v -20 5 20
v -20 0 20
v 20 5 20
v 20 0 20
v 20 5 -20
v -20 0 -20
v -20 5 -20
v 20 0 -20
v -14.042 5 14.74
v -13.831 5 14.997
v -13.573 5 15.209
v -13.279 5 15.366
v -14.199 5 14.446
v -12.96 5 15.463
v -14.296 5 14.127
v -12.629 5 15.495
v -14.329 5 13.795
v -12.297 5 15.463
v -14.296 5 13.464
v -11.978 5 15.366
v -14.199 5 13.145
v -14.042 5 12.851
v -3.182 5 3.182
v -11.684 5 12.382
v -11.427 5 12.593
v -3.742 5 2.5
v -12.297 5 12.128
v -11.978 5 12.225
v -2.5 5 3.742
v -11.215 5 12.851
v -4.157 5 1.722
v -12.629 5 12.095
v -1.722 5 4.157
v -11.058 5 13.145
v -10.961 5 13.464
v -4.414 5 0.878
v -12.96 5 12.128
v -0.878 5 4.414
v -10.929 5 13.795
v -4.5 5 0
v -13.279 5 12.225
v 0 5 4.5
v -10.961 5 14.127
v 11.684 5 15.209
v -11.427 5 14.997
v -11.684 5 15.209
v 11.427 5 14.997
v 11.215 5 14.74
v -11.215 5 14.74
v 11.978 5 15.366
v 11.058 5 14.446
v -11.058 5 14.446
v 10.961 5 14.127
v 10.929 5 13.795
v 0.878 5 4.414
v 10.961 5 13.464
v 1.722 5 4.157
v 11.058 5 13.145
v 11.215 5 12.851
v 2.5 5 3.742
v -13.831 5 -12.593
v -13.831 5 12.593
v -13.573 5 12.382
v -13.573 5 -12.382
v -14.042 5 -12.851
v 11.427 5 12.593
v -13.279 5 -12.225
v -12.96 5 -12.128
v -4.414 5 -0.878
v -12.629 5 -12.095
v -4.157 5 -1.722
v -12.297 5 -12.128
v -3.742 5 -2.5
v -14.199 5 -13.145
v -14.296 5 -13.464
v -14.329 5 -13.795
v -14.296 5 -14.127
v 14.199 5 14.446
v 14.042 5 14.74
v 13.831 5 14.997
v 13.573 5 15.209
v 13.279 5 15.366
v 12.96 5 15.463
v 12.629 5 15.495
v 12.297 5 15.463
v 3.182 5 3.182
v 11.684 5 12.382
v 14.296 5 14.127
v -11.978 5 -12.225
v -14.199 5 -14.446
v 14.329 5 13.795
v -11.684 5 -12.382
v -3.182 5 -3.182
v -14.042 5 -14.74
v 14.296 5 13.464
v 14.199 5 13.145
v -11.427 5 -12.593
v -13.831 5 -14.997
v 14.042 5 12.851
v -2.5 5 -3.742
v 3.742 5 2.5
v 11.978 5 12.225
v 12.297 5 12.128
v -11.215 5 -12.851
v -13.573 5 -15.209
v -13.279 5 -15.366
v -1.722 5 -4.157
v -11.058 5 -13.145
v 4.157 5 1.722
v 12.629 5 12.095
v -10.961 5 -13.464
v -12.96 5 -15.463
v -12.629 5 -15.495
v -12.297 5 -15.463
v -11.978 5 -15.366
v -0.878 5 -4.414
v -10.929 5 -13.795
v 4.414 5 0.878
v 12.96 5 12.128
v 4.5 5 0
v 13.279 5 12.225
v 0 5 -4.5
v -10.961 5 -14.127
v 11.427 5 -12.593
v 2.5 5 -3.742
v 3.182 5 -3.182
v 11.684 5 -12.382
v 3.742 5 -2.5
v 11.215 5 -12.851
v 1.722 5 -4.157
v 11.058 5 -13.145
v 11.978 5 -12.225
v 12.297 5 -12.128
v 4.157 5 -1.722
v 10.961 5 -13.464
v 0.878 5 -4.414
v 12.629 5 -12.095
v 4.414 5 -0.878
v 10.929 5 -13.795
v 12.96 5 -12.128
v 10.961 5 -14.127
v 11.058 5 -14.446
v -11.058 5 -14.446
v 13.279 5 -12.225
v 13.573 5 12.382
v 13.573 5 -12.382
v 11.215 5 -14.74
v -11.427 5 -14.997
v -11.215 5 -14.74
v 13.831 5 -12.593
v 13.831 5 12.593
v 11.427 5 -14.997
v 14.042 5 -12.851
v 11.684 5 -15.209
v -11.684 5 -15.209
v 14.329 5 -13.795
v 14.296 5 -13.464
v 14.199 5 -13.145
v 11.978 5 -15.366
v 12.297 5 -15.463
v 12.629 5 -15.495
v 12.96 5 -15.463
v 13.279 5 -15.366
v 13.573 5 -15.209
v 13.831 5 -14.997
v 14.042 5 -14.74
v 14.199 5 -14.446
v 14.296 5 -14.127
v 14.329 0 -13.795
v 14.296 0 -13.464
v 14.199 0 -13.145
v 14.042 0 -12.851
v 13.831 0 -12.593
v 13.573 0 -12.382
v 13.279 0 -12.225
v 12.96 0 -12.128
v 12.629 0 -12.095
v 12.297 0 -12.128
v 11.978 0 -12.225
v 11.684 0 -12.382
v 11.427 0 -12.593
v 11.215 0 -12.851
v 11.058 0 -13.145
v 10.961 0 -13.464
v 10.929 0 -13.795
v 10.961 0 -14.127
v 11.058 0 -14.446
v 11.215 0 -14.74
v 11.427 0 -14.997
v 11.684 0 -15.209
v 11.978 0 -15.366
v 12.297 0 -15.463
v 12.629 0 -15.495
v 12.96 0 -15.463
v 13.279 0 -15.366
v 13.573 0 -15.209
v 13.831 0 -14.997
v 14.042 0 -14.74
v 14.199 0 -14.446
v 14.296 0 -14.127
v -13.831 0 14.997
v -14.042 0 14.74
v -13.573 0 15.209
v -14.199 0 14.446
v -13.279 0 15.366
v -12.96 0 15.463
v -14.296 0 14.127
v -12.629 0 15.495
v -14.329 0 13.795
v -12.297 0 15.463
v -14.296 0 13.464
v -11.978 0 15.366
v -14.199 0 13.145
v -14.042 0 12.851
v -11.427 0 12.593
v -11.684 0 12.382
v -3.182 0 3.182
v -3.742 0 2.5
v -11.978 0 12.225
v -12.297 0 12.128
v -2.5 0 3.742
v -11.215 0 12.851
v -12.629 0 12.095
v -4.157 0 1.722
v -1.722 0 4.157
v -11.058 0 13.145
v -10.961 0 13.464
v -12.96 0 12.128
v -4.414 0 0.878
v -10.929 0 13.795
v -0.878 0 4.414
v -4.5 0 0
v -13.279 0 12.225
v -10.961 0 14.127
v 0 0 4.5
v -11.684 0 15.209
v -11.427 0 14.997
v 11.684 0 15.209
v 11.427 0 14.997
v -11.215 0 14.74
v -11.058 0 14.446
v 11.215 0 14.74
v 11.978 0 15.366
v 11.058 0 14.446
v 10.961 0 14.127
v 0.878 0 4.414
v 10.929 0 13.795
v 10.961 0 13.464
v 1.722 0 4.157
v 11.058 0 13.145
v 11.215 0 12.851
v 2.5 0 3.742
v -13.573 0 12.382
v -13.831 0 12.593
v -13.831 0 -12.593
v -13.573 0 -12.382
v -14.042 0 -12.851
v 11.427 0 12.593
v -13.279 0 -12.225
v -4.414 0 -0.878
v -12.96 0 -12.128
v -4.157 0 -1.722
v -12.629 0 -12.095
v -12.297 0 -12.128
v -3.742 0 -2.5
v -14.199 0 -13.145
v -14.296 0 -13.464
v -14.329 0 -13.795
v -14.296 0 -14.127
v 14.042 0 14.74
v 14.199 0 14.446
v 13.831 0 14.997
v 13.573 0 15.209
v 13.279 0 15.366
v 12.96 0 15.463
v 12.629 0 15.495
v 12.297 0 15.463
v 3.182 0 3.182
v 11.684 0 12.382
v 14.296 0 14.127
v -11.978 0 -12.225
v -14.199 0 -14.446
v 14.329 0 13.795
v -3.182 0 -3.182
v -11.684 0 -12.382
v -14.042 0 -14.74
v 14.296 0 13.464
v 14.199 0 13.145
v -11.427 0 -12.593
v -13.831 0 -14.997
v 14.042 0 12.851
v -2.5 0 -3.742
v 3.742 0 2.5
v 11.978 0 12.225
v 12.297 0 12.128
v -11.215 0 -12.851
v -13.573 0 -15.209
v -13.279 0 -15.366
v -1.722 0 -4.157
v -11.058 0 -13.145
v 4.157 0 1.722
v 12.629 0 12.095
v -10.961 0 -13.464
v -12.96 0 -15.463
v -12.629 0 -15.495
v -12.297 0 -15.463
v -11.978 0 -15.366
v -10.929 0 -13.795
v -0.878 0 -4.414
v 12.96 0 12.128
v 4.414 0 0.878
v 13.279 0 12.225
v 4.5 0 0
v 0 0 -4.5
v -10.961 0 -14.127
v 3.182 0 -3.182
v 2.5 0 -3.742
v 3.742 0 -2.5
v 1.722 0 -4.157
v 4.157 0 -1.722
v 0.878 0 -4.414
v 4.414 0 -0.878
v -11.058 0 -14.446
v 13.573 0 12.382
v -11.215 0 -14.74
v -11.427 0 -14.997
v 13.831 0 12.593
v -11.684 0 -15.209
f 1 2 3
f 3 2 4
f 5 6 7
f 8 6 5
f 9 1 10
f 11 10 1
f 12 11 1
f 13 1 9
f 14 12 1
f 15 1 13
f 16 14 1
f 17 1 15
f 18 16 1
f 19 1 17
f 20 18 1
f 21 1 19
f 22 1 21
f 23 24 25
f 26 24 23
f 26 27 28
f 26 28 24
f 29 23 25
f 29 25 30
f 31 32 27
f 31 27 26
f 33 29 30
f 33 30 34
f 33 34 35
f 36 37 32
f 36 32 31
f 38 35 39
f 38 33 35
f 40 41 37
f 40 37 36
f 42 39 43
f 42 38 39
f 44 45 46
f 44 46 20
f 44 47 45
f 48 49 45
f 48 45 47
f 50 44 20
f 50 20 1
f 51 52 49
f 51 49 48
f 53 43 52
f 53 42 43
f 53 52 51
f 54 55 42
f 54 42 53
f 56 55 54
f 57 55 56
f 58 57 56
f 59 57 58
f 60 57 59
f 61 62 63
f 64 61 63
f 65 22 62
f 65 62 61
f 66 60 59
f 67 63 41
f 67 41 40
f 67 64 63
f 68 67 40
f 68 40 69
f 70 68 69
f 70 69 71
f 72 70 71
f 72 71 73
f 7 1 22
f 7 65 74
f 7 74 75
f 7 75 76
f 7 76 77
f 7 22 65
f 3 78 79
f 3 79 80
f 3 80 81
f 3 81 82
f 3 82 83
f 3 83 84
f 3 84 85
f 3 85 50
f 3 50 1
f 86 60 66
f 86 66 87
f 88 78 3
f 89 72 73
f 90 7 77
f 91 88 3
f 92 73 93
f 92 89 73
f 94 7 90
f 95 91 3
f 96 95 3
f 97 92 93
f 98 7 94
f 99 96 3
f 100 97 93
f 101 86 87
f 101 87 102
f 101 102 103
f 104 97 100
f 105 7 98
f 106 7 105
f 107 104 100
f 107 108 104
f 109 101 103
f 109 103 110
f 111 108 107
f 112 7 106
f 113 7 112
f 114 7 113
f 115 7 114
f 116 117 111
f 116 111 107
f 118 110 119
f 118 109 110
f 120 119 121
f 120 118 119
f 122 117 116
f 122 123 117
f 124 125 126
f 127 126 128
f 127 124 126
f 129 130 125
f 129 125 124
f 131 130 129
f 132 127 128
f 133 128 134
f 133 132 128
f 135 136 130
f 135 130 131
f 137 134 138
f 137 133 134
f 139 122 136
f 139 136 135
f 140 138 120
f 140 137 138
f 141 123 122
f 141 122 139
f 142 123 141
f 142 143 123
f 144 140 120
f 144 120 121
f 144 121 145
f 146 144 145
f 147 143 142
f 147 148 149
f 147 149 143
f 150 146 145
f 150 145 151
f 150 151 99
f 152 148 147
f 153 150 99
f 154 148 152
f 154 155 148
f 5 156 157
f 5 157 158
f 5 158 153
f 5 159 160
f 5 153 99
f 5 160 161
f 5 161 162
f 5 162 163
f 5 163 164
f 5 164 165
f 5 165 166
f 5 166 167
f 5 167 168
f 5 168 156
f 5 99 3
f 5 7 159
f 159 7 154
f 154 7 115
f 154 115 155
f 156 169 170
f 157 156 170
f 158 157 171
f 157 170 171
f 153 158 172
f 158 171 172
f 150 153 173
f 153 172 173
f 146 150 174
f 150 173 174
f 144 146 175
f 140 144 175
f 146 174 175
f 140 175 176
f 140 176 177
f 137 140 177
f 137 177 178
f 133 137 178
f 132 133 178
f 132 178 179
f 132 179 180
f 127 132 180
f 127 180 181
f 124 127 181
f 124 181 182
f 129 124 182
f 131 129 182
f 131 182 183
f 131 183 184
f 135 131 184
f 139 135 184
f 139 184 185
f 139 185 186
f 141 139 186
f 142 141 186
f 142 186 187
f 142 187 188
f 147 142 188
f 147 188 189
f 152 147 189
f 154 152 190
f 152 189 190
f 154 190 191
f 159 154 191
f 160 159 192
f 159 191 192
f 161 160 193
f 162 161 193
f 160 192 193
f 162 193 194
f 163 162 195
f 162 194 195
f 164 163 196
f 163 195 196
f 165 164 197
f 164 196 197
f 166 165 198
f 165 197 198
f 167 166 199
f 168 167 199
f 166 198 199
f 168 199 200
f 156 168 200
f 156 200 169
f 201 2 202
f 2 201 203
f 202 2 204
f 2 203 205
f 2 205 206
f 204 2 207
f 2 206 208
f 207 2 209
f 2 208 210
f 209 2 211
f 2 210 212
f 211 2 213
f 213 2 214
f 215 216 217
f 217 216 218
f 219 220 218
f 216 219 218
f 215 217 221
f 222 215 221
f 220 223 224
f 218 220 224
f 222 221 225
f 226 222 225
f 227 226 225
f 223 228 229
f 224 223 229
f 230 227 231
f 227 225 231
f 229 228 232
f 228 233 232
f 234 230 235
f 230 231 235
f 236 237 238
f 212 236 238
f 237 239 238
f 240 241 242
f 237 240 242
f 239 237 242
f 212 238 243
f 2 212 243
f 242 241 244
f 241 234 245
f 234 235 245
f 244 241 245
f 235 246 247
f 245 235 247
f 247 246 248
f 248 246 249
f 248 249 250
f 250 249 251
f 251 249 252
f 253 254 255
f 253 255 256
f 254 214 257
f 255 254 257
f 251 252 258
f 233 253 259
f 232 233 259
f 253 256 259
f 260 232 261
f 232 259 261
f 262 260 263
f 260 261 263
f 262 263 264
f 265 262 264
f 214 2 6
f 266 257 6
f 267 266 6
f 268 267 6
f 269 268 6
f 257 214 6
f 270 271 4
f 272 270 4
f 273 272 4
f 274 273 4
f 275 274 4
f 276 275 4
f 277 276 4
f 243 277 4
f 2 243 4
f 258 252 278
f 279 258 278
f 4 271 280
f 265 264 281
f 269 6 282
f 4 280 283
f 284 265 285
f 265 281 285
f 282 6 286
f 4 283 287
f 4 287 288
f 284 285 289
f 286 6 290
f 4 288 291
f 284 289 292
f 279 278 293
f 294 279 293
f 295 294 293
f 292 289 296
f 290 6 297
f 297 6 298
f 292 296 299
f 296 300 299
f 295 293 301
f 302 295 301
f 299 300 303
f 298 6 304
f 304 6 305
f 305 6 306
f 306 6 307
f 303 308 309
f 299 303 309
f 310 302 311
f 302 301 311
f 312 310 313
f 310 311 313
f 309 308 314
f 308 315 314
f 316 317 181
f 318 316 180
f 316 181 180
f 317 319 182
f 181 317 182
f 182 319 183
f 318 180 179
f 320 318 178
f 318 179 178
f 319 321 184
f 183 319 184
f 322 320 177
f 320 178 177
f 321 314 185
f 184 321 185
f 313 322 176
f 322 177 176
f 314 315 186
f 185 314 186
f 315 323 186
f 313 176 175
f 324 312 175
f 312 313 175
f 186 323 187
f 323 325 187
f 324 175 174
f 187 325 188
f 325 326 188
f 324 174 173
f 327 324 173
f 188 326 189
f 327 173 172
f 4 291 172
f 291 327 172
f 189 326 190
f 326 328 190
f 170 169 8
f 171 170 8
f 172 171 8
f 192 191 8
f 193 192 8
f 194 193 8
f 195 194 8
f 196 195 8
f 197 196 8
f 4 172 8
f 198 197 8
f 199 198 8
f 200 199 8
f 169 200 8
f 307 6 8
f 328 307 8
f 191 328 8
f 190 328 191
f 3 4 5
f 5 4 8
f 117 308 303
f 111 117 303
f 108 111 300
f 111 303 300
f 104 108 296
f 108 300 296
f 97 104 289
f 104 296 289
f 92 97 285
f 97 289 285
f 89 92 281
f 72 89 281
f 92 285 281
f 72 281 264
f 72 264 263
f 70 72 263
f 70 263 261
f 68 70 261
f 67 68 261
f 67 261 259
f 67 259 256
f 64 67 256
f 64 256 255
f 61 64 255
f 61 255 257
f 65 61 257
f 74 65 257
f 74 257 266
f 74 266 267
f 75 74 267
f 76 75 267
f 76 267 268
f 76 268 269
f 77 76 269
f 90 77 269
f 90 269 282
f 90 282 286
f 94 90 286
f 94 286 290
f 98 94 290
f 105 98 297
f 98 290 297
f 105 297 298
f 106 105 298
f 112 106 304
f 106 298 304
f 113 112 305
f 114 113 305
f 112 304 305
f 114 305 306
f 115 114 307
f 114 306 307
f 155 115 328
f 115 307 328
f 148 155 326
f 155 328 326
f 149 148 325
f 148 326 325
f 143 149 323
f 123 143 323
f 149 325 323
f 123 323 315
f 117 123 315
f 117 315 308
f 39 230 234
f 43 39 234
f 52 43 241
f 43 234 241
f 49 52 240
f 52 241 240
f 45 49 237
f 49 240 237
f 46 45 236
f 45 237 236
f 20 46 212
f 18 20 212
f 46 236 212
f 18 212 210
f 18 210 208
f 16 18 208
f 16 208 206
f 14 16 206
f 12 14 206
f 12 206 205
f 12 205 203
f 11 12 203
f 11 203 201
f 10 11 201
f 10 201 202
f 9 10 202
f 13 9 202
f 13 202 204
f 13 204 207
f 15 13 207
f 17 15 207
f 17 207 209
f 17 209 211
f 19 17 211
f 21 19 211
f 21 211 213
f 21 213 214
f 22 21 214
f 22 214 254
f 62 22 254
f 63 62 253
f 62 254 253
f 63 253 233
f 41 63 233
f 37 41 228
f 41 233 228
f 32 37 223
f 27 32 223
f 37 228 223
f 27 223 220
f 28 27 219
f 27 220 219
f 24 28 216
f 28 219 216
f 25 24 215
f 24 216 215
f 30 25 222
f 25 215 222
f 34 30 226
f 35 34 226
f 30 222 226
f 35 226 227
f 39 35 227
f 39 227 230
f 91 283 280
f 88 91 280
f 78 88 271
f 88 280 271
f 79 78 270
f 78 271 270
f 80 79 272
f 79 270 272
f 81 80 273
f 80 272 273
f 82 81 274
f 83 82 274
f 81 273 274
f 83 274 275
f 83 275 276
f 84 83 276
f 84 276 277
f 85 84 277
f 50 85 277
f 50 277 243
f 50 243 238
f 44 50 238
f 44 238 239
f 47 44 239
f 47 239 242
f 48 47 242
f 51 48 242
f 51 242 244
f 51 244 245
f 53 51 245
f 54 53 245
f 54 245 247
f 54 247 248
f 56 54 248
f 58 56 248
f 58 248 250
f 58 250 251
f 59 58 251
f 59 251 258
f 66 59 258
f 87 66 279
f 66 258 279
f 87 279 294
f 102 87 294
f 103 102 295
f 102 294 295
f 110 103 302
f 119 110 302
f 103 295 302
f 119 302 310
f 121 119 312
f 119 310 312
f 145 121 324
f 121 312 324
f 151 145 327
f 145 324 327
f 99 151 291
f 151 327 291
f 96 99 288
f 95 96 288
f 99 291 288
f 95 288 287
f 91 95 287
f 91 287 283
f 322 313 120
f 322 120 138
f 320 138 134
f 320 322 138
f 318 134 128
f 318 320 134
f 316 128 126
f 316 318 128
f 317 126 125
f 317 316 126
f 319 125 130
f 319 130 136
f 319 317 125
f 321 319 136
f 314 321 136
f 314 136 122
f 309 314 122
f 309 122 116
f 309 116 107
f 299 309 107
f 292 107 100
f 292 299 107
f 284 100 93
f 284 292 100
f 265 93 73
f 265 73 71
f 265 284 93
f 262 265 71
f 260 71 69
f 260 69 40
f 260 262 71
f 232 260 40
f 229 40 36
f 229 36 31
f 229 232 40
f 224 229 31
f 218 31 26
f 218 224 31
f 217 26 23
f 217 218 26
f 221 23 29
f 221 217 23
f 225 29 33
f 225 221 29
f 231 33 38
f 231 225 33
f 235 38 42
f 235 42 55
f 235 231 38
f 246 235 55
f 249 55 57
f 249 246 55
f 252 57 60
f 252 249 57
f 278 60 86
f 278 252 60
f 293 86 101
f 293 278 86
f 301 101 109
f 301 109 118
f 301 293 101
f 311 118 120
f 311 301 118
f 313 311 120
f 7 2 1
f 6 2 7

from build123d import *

# Parameters (mm, degrees)
CROQUIS1_W              = 40
CROQUIS1_H              = 40
CROQUIS1_R              = 4.5
SALIENTE_EXTRUIR1_DEPTH = 5
CROQUIS2_R              = 1.7
CORTAR_EXTRUIR1_DEPTH   = 10


with BuildPart() as part:
    # Croquis1 → Saliente-Extruir1 (new body)
    with BuildSketch(Plane(origin=(0, 0, 0), x_dir=(1, 0, 0), z_dir=(0, 1, 0))):
        Rectangle(CROQUIS1_W, CROQUIS1_H)
        Circle(CROQUIS1_R, mode=Mode.SUBTRACT)
    extrude(amount=SALIENTE_EXTRUIR1_DEPTH)

    # Croquis2 → Cortar-Extruir1 (cut)
    with BuildSketch(Plane.XZ):
        with Locations((12.628756813, -13.795283125)):
            Circle(CROQUIS2_R)
        with Locations((12.628756813, 13.795283125)):
            Circle(CROQUIS2_R)
        with Locations((-12.628756813, 13.795283125)):
            Circle(CROQUIS2_R)
        with Locations((-12.628756813, -13.795283125)):
            Circle(CROQUIS2_R)
    extrude(amount=-CORTAR_EXTRUIR1_DEPTH, mode=Mode.SUBTRACT)


solid = part.part
